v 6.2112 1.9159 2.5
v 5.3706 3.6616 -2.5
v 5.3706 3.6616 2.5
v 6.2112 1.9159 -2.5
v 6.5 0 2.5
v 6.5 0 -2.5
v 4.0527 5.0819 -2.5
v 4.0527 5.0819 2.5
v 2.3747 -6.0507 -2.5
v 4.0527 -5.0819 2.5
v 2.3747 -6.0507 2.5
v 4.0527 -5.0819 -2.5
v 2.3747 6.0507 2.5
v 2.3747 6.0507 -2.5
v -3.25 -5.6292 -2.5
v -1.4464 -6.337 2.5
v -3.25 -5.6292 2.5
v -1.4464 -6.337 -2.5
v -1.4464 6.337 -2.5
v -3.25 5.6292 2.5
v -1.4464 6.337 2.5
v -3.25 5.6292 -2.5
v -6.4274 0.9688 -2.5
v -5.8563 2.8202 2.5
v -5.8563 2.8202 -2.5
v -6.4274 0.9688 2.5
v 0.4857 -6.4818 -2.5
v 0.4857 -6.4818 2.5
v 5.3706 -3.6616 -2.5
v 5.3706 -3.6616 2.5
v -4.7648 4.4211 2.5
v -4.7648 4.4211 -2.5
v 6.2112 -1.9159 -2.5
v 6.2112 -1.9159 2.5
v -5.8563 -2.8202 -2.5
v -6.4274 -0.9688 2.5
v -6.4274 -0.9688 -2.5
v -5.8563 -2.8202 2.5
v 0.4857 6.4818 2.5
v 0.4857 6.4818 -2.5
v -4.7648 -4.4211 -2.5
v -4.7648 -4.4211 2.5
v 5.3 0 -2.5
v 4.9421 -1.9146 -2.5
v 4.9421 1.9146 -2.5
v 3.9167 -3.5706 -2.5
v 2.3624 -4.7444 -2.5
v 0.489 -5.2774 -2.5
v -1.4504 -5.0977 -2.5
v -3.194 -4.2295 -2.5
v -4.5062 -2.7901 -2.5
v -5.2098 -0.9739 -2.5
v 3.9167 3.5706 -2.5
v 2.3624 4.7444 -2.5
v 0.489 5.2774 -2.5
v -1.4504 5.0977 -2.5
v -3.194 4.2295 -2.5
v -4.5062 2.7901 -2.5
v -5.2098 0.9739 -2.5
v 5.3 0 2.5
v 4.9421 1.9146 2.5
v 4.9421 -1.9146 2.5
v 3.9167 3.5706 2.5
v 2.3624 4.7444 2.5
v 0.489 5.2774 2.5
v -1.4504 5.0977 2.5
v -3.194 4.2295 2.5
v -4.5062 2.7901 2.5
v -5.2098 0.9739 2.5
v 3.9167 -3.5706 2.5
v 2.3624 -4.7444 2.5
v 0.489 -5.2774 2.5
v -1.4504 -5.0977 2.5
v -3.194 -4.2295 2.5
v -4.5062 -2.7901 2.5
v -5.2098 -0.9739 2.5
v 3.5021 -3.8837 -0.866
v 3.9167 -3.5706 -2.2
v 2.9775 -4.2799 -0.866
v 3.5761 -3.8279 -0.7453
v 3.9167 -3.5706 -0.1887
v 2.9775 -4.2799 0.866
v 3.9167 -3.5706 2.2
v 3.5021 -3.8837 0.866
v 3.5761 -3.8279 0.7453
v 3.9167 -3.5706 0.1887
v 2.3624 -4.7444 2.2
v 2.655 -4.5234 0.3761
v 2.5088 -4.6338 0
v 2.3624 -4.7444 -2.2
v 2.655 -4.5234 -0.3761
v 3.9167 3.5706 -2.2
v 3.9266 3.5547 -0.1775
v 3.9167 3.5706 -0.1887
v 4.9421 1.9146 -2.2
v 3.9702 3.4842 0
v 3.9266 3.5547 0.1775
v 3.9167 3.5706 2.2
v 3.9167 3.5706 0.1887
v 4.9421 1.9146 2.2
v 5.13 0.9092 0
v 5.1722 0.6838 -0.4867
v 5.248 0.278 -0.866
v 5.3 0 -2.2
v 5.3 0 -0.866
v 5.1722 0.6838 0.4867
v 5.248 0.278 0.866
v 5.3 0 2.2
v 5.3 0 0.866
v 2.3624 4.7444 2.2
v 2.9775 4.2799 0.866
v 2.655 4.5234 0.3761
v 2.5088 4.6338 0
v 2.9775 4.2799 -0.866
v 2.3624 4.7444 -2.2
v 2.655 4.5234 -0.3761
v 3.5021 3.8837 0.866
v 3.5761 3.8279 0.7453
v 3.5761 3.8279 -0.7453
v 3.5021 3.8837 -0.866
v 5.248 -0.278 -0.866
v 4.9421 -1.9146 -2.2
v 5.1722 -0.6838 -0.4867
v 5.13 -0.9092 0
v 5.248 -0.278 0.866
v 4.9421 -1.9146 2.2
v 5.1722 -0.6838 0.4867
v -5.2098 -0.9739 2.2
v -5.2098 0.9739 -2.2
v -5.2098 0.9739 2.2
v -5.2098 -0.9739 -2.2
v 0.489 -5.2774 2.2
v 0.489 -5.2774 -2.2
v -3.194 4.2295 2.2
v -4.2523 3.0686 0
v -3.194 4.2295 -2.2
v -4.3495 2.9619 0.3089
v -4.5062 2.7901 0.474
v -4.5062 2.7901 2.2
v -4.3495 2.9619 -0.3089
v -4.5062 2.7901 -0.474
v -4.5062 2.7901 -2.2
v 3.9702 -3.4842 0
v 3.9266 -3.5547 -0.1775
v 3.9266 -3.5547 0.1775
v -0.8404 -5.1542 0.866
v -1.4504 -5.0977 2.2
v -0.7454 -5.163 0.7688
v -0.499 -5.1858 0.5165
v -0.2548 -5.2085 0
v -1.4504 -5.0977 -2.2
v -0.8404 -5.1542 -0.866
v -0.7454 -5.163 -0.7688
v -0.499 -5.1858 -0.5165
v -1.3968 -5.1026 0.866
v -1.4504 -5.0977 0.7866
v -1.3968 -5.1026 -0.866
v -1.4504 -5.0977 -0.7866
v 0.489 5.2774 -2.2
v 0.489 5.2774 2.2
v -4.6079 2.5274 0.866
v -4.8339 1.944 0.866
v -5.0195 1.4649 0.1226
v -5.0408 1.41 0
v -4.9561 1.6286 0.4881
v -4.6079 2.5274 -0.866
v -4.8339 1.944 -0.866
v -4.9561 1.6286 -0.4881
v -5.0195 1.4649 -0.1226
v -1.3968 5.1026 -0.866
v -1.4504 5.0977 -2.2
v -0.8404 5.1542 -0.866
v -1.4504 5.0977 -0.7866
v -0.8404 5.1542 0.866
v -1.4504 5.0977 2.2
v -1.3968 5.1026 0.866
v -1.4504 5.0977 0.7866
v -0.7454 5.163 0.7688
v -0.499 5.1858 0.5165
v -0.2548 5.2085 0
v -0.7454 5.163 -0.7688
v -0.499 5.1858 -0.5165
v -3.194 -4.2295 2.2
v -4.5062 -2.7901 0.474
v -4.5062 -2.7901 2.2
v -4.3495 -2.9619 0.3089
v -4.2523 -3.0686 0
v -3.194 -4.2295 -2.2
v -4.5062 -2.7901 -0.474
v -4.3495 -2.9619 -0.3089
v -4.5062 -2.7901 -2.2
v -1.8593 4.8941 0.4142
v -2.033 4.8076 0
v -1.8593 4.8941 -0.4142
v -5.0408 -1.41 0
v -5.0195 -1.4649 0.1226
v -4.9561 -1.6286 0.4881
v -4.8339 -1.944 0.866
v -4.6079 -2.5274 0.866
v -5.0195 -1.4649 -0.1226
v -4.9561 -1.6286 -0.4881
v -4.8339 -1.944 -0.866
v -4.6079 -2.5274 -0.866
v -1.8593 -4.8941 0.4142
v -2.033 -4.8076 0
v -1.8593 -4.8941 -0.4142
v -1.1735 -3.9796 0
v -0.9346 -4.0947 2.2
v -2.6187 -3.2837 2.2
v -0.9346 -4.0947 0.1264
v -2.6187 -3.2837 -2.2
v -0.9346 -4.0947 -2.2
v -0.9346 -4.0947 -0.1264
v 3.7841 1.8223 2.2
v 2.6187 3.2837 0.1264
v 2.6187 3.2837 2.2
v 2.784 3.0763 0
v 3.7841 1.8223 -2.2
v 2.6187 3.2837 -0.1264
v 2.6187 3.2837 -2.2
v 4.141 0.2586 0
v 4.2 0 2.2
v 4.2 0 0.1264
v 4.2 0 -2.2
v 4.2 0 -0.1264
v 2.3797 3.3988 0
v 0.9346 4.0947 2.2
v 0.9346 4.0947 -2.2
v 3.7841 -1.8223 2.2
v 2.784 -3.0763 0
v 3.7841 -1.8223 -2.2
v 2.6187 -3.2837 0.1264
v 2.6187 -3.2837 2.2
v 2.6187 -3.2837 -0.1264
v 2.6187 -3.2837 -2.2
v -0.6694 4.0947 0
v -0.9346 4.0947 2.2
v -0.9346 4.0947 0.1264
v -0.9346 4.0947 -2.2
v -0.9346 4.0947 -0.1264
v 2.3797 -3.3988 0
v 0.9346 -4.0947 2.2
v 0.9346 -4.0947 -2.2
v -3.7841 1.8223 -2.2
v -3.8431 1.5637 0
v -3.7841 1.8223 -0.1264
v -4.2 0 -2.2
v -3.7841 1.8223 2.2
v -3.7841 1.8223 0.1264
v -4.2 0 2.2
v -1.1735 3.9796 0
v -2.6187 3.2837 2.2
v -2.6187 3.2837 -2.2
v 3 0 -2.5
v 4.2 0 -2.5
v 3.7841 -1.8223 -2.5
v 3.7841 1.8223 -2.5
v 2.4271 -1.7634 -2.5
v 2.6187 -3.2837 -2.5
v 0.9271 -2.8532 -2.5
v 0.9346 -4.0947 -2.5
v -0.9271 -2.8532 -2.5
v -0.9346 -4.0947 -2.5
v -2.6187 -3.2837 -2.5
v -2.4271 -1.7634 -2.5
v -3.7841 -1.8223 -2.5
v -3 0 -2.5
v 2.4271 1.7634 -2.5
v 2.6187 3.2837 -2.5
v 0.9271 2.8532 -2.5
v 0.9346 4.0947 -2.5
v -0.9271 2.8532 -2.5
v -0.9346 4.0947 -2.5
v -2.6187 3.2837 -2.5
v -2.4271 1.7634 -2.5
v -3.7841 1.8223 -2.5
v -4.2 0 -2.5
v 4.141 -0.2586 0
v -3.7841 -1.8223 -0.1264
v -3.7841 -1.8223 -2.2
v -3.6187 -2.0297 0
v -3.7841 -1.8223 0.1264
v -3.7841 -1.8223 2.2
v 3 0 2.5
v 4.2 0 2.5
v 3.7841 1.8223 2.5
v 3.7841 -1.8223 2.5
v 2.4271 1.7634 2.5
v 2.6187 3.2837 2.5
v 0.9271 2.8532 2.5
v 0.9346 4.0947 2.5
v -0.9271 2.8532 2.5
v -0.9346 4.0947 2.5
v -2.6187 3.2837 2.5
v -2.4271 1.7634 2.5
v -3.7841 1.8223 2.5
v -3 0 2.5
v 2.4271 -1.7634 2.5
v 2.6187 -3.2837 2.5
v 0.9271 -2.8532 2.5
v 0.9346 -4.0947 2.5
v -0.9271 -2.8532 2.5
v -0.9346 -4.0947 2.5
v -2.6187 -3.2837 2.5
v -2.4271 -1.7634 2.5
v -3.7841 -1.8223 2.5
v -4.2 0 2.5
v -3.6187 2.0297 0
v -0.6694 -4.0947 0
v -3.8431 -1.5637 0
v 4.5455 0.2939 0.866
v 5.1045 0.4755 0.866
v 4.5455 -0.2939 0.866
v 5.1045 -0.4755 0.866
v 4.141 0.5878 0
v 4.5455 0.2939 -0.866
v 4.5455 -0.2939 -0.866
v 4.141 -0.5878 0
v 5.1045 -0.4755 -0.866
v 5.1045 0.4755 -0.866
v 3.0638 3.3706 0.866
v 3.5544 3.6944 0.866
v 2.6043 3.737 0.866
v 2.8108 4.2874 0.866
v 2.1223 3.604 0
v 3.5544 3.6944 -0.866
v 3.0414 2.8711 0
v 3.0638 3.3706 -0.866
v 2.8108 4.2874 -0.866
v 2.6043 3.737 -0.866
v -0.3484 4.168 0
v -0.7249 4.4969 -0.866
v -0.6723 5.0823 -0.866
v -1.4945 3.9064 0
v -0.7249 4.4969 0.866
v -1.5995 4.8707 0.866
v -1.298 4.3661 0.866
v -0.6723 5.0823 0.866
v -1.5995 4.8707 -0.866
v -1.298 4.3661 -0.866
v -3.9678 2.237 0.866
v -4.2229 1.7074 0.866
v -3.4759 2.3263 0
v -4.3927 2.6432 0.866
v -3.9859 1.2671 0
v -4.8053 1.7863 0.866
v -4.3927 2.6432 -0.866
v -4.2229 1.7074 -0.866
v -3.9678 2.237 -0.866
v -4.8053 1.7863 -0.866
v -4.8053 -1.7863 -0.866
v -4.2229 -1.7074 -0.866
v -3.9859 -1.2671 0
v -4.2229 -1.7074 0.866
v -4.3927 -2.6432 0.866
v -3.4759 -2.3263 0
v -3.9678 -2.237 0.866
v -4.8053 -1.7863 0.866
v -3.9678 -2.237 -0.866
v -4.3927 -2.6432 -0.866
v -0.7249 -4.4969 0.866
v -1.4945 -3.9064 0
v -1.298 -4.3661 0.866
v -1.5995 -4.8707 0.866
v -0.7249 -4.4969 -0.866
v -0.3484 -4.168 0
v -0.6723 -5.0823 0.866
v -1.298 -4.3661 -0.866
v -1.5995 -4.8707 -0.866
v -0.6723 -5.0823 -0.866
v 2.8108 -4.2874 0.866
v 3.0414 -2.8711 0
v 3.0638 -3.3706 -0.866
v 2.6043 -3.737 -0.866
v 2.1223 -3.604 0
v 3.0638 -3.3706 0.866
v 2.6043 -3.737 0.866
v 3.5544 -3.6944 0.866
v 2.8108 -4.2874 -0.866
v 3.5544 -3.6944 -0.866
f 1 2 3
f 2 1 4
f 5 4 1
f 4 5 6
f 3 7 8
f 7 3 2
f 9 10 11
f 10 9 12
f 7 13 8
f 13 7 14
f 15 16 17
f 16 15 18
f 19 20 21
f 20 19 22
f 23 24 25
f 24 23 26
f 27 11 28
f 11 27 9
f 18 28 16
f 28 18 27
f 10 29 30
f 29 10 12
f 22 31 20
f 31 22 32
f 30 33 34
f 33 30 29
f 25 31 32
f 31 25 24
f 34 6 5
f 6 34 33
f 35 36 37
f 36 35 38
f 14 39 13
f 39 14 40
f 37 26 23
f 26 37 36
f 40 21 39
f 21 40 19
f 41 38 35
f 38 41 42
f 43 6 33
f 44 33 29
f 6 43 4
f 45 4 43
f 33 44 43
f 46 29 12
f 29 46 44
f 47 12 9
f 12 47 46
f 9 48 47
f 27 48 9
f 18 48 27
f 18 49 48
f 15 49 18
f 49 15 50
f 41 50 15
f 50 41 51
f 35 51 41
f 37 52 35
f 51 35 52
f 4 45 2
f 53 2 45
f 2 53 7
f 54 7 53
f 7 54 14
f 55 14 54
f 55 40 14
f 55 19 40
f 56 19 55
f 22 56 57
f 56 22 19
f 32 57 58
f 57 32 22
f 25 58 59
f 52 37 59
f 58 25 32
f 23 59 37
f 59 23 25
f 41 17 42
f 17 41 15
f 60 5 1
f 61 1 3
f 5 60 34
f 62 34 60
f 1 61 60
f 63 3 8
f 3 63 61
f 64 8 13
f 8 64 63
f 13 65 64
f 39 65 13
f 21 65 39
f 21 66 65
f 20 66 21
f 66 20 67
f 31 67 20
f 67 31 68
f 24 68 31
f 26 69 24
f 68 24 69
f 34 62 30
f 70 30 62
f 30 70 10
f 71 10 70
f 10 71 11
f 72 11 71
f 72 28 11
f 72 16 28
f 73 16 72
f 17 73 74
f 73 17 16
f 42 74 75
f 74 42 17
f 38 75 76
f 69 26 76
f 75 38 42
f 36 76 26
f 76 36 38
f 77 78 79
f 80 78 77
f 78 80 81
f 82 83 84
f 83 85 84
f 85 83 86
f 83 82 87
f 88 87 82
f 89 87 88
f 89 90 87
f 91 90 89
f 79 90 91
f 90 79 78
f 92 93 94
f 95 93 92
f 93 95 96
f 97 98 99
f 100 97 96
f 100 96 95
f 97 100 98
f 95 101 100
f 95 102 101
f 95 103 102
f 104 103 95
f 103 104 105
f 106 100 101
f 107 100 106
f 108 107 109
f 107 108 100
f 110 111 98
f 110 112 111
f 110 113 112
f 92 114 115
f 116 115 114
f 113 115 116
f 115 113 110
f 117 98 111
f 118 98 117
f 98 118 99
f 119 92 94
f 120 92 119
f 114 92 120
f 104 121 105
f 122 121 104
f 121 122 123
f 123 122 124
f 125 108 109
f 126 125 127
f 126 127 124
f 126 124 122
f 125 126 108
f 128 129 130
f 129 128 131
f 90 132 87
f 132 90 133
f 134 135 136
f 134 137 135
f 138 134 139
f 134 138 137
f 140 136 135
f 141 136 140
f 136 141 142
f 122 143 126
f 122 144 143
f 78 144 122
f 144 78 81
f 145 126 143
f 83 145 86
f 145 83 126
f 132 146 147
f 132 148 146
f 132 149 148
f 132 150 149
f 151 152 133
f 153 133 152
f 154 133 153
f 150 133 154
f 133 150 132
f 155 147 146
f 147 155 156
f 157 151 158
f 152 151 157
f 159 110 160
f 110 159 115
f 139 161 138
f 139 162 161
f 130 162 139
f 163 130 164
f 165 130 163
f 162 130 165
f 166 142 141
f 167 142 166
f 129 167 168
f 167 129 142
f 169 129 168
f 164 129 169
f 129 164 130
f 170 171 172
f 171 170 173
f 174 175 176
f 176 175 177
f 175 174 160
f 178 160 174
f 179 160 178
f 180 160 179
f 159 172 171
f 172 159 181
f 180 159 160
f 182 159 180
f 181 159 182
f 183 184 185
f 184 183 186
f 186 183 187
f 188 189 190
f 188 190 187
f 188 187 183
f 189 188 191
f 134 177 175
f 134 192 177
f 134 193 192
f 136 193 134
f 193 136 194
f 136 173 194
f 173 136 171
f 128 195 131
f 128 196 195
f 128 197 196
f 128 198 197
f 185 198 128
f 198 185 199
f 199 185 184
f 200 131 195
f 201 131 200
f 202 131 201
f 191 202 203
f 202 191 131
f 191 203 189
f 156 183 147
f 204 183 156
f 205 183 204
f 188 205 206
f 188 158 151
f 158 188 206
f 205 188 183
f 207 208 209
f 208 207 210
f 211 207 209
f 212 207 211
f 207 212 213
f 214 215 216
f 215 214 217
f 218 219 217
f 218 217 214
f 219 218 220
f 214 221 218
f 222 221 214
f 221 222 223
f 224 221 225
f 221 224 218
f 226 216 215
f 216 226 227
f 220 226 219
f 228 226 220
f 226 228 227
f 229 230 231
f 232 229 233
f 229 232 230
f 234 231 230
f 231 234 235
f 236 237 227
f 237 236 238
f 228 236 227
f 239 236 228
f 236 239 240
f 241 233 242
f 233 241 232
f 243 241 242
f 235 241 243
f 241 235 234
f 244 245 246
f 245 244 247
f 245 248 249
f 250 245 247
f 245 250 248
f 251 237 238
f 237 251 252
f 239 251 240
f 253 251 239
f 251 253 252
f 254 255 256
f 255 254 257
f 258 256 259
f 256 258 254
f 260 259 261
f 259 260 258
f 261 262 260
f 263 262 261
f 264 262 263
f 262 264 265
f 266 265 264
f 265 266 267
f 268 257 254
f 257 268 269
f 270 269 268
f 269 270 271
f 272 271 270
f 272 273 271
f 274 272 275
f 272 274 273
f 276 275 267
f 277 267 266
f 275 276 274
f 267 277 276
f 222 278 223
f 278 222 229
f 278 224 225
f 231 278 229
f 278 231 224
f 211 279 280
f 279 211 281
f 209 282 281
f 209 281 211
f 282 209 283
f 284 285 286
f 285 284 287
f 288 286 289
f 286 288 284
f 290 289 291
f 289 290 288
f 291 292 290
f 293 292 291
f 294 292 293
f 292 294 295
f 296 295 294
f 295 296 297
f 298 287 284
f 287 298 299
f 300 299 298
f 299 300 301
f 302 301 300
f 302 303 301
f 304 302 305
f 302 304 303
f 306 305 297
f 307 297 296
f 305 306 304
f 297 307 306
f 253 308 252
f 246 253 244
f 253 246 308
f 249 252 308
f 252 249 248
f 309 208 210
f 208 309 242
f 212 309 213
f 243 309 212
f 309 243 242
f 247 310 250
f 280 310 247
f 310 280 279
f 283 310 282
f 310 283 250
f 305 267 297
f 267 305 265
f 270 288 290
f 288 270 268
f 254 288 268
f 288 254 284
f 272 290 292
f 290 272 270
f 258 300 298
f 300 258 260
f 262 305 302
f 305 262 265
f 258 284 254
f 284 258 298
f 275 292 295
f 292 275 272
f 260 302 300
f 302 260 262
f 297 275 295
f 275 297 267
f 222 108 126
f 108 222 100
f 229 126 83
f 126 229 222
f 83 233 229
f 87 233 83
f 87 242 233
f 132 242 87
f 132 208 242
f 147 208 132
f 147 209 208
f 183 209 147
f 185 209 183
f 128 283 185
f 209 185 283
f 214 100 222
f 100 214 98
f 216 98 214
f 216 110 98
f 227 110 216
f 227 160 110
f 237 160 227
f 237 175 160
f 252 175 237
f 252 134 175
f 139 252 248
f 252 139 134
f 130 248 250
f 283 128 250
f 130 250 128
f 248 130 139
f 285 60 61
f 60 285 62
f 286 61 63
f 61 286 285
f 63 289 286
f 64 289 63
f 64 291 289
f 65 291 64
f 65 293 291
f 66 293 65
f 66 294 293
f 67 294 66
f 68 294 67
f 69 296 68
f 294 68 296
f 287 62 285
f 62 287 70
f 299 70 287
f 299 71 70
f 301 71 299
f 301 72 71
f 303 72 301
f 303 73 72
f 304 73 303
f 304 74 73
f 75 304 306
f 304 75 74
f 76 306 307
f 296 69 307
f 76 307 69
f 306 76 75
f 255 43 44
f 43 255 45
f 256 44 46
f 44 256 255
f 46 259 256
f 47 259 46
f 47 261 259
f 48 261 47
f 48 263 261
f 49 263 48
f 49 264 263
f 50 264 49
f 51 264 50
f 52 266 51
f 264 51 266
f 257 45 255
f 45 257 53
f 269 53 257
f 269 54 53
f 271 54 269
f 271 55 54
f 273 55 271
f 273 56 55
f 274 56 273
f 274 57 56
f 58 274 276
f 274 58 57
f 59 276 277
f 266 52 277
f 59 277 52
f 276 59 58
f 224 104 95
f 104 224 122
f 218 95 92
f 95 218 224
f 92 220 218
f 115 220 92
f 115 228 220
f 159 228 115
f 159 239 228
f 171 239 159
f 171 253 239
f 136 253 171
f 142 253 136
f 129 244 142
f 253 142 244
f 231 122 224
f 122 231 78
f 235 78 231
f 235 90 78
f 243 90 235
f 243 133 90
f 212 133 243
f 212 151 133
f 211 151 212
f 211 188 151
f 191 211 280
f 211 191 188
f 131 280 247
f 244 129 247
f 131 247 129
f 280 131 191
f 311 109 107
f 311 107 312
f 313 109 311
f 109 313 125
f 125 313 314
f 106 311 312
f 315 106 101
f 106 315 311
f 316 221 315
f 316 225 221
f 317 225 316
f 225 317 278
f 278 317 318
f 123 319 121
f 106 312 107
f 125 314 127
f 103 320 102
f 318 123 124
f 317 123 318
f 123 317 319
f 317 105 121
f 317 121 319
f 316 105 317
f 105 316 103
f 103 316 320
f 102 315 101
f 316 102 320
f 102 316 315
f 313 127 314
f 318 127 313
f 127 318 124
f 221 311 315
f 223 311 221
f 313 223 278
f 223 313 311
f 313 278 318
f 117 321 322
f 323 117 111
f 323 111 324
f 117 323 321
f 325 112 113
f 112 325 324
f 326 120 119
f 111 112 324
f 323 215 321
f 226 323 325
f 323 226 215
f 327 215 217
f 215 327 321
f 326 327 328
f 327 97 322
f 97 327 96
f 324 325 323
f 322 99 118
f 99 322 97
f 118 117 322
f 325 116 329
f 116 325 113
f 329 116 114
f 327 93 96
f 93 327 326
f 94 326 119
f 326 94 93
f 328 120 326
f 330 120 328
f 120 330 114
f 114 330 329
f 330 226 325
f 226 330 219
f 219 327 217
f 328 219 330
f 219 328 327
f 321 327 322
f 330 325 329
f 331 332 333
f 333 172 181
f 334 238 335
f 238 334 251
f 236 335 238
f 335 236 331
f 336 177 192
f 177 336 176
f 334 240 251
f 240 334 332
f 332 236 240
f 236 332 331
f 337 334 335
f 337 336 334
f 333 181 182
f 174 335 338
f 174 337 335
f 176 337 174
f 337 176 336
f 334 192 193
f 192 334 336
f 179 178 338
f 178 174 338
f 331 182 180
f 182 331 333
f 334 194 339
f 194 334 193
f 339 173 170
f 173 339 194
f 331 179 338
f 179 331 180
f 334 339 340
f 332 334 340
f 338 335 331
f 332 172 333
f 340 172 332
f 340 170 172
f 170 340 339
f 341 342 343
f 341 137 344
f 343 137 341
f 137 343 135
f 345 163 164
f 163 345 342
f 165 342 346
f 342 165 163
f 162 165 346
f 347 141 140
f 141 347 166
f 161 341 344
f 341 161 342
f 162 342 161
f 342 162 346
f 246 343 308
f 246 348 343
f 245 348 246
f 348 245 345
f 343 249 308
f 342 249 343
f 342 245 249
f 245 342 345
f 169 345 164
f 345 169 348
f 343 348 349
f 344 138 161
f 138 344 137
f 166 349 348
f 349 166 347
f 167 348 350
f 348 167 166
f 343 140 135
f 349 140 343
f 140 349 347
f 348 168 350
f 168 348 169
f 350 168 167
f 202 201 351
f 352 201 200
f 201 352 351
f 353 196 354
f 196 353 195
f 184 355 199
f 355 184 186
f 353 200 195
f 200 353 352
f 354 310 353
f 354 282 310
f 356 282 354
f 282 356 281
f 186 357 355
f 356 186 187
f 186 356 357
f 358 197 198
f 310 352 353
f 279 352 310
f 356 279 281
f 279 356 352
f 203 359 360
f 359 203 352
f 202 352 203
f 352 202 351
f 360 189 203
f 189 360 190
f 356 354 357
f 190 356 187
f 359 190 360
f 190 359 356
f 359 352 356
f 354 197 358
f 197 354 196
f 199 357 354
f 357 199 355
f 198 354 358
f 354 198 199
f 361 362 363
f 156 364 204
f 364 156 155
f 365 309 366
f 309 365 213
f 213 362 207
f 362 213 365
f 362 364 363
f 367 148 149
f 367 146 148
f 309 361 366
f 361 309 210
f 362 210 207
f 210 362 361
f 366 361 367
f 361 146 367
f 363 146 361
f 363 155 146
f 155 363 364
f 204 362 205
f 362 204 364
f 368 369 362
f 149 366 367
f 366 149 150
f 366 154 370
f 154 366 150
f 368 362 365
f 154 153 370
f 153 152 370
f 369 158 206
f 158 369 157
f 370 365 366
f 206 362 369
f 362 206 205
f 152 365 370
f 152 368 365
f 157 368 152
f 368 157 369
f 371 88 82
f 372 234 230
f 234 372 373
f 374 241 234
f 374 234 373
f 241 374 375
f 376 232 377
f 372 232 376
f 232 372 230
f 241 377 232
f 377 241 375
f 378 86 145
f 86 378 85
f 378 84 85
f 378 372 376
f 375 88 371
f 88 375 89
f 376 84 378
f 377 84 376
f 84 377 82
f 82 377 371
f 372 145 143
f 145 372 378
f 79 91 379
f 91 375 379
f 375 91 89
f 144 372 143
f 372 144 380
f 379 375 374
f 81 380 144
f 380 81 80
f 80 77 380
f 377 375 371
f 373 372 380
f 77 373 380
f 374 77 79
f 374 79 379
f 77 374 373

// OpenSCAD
// Parameters
bore_diameter_mm = 6; //[3:12:0.1]
outer_diameter_mm = 13; //[6.5:26:0.1]
width_mm = 5; //[2.5:10:0.1]
race_radial_thickness_mm = 1.2; //[0.6:2.4:0.1]
race_axial_lip_mm = 0.6; //[0.3:1.2:0.1]
shield_thickness_mm = 0.3; //[0.2:0.8:0.05]
ball_diameter_mm = 2; //[1:3.5:0.1]
ball_count = 7; //[5:10:1]
ball_radial_clearance_mm = 0.2; //[0.05:0.6:0.05]
connect_overlap_mm = 0.8; //[0.5:2:0.1]

// Bearing Ball - complete geometry
module bearing_ball() {
  color("Silver") {
    sphere(r=ball_diameter_mm/2);
  }
}

// Ball Bearing - complete geometry
module ball_bearing() {
  color("DimGray") {
    // Outer Race
    difference() {
      cylinder(r=outer_diameter_mm/2, h=width_mm, center=true);
      cylinder(r=outer_diameter_mm/2 - race_radial_thickness_mm, h=width_mm + 2*connect_overlap_mm, center=true);
    }
    
    // Inner Race
    difference() {
      cylinder(r=bore_diameter_mm/2 + race_radial_thickness_mm, h=width_mm, center=true);
      cylinder(r=bore_diameter_mm/2, h=width_mm + 2*connect_overlap_mm, center=true);
    }
    
    // Shields
    translate([0, 0, width_mm/2 - shield_thickness_mm/2]) {
      difference() {
        cylinder(r=outer_diameter_mm/2 - race_radial_thickness_mm/2, h=shield_thickness_mm, center=true);
        cylinder(r=bore_diameter_mm/2 + race_radial_thickness_mm/2, h=shield_thickness_mm + 2*connect_overlap_mm, center=true);
      }
    }
    translate([0, 0, -(width_mm/2 - shield_thickness_mm/2)]) {
      difference() {
        cylinder(r=outer_diameter_mm/2 - race_radial_thickness_mm/2, h=shield_thickness_mm, center=true);
        cylinder(r=bore_diameter_mm/2 + race_radial_thickness_mm/2, h=shield_thickness_mm + 2*connect_overlap_mm, center=true);
      }
    }
    
    // Bearing Balls
    for (i = [0:ball_count-1]) {
      rotate([0, 0, i*360/ball_count]) {
        translate([((bore_diameter_mm/2 + race_radial_thickness_mm) + (outer_diameter_mm/2 - race_radial_thickness_mm))/2 + ball_radial_clearance_mm, 0, 0]) {
          bearing_ball();
        }
      }
    }
  }
}

// Assembly
module assembly() {
  ball_bearing();
}

assembly();
